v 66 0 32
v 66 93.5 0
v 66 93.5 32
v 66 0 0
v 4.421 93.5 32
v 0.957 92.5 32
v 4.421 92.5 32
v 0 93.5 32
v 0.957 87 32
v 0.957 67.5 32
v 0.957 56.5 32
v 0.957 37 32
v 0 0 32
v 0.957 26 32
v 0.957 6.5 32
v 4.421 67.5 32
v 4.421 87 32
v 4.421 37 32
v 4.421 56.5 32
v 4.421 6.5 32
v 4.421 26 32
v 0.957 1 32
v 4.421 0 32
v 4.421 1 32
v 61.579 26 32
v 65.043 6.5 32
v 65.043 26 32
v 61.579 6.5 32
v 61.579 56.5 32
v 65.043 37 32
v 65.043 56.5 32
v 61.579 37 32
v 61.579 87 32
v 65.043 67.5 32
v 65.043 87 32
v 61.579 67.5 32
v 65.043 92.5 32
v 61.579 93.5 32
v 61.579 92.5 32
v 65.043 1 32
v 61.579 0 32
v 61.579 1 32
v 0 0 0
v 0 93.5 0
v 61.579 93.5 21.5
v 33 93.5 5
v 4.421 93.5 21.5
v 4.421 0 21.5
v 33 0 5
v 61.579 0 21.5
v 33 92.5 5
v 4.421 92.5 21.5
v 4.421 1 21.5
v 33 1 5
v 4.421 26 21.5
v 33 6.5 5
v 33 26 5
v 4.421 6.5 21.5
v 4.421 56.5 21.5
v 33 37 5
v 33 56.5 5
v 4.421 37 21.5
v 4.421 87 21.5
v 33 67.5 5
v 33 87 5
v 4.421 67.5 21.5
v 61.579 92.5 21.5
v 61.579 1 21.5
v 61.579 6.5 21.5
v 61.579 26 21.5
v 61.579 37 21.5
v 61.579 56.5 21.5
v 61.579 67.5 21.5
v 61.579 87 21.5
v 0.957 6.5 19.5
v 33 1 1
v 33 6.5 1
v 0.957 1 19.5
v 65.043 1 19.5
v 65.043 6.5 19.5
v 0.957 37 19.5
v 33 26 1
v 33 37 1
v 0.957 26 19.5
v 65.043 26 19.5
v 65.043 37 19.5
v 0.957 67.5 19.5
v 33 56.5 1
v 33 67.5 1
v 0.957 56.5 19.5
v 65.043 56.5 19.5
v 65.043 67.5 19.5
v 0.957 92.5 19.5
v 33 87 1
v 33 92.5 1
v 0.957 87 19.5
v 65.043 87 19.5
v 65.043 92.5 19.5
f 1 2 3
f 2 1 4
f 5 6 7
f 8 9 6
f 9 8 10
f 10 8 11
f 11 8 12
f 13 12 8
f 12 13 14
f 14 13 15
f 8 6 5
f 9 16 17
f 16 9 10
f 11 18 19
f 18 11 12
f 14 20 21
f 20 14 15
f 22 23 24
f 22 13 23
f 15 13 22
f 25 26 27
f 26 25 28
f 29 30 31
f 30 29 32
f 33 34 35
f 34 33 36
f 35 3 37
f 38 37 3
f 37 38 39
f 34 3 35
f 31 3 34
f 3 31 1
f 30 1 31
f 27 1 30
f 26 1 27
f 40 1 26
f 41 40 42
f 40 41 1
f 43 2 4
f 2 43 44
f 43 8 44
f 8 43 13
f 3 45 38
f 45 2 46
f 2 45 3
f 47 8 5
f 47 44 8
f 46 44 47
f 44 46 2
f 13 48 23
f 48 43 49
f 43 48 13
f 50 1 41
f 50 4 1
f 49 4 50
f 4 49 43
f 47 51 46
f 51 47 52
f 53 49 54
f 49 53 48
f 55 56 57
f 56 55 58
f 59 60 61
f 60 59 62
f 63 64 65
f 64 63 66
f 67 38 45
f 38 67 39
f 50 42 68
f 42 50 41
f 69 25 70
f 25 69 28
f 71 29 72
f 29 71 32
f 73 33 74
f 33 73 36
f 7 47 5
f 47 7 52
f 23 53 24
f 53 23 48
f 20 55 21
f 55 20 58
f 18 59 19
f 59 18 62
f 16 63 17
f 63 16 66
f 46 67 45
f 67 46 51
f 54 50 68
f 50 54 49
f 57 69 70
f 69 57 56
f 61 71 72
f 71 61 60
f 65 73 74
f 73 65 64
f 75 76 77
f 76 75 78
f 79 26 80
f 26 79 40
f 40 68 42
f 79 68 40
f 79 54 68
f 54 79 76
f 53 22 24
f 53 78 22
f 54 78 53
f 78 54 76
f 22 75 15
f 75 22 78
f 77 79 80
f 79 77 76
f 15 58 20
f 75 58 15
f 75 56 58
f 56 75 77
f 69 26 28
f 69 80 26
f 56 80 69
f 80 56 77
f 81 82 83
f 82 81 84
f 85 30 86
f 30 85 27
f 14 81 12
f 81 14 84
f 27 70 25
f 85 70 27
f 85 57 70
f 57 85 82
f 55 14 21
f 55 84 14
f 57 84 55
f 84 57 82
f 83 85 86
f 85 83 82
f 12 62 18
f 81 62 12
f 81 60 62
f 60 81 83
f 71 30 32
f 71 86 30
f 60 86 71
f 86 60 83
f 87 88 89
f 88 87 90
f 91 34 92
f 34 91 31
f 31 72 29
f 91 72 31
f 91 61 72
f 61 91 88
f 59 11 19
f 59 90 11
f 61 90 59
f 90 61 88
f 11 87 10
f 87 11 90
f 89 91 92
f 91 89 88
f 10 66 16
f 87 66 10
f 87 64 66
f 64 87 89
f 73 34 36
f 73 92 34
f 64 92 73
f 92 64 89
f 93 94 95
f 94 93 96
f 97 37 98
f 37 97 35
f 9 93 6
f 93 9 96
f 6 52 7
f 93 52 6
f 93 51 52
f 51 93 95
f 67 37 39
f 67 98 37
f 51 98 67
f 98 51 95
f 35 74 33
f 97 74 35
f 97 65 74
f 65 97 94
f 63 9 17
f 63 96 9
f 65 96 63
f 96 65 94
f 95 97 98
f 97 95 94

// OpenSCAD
$fn=200;
THICK = 1;

TILE_L = 25;
TILE_COUNT = 6;

BOX_W = 64;
BOX_L = 91.5;//122; //83
BOX_H = 32;

difference() {
    cube(size = [
        BOX_W + (THICK * 2),
        BOX_L + (THICK * 2), 
        BOX_H]);

    translate([33, -5, 38])
        rotate([0, 90, 90]) 
            cylinder(h = 200, r = 33, $fn=6);


    tile_slot(1);
    tile_slot(1 + TILE_L);

    tile_slot(6.5 + TILE_L);
    tile_slot(6.5 + (TILE_L * 2));

    tile_slot(12 + (TILE_L * 2));
    tile_slot(12 + (TILE_L * 3));

    // tile_slot(17.5 + (TILE_L * 3));
    // tile_slot(17.5 + (TILE_L * 4));
}

module tile_slot(y) {
    translate([33, y, 38])
        rotate([0, 90, 90]) 
            cylinder(h = 5.5, r = 37, $fn=6);
}
